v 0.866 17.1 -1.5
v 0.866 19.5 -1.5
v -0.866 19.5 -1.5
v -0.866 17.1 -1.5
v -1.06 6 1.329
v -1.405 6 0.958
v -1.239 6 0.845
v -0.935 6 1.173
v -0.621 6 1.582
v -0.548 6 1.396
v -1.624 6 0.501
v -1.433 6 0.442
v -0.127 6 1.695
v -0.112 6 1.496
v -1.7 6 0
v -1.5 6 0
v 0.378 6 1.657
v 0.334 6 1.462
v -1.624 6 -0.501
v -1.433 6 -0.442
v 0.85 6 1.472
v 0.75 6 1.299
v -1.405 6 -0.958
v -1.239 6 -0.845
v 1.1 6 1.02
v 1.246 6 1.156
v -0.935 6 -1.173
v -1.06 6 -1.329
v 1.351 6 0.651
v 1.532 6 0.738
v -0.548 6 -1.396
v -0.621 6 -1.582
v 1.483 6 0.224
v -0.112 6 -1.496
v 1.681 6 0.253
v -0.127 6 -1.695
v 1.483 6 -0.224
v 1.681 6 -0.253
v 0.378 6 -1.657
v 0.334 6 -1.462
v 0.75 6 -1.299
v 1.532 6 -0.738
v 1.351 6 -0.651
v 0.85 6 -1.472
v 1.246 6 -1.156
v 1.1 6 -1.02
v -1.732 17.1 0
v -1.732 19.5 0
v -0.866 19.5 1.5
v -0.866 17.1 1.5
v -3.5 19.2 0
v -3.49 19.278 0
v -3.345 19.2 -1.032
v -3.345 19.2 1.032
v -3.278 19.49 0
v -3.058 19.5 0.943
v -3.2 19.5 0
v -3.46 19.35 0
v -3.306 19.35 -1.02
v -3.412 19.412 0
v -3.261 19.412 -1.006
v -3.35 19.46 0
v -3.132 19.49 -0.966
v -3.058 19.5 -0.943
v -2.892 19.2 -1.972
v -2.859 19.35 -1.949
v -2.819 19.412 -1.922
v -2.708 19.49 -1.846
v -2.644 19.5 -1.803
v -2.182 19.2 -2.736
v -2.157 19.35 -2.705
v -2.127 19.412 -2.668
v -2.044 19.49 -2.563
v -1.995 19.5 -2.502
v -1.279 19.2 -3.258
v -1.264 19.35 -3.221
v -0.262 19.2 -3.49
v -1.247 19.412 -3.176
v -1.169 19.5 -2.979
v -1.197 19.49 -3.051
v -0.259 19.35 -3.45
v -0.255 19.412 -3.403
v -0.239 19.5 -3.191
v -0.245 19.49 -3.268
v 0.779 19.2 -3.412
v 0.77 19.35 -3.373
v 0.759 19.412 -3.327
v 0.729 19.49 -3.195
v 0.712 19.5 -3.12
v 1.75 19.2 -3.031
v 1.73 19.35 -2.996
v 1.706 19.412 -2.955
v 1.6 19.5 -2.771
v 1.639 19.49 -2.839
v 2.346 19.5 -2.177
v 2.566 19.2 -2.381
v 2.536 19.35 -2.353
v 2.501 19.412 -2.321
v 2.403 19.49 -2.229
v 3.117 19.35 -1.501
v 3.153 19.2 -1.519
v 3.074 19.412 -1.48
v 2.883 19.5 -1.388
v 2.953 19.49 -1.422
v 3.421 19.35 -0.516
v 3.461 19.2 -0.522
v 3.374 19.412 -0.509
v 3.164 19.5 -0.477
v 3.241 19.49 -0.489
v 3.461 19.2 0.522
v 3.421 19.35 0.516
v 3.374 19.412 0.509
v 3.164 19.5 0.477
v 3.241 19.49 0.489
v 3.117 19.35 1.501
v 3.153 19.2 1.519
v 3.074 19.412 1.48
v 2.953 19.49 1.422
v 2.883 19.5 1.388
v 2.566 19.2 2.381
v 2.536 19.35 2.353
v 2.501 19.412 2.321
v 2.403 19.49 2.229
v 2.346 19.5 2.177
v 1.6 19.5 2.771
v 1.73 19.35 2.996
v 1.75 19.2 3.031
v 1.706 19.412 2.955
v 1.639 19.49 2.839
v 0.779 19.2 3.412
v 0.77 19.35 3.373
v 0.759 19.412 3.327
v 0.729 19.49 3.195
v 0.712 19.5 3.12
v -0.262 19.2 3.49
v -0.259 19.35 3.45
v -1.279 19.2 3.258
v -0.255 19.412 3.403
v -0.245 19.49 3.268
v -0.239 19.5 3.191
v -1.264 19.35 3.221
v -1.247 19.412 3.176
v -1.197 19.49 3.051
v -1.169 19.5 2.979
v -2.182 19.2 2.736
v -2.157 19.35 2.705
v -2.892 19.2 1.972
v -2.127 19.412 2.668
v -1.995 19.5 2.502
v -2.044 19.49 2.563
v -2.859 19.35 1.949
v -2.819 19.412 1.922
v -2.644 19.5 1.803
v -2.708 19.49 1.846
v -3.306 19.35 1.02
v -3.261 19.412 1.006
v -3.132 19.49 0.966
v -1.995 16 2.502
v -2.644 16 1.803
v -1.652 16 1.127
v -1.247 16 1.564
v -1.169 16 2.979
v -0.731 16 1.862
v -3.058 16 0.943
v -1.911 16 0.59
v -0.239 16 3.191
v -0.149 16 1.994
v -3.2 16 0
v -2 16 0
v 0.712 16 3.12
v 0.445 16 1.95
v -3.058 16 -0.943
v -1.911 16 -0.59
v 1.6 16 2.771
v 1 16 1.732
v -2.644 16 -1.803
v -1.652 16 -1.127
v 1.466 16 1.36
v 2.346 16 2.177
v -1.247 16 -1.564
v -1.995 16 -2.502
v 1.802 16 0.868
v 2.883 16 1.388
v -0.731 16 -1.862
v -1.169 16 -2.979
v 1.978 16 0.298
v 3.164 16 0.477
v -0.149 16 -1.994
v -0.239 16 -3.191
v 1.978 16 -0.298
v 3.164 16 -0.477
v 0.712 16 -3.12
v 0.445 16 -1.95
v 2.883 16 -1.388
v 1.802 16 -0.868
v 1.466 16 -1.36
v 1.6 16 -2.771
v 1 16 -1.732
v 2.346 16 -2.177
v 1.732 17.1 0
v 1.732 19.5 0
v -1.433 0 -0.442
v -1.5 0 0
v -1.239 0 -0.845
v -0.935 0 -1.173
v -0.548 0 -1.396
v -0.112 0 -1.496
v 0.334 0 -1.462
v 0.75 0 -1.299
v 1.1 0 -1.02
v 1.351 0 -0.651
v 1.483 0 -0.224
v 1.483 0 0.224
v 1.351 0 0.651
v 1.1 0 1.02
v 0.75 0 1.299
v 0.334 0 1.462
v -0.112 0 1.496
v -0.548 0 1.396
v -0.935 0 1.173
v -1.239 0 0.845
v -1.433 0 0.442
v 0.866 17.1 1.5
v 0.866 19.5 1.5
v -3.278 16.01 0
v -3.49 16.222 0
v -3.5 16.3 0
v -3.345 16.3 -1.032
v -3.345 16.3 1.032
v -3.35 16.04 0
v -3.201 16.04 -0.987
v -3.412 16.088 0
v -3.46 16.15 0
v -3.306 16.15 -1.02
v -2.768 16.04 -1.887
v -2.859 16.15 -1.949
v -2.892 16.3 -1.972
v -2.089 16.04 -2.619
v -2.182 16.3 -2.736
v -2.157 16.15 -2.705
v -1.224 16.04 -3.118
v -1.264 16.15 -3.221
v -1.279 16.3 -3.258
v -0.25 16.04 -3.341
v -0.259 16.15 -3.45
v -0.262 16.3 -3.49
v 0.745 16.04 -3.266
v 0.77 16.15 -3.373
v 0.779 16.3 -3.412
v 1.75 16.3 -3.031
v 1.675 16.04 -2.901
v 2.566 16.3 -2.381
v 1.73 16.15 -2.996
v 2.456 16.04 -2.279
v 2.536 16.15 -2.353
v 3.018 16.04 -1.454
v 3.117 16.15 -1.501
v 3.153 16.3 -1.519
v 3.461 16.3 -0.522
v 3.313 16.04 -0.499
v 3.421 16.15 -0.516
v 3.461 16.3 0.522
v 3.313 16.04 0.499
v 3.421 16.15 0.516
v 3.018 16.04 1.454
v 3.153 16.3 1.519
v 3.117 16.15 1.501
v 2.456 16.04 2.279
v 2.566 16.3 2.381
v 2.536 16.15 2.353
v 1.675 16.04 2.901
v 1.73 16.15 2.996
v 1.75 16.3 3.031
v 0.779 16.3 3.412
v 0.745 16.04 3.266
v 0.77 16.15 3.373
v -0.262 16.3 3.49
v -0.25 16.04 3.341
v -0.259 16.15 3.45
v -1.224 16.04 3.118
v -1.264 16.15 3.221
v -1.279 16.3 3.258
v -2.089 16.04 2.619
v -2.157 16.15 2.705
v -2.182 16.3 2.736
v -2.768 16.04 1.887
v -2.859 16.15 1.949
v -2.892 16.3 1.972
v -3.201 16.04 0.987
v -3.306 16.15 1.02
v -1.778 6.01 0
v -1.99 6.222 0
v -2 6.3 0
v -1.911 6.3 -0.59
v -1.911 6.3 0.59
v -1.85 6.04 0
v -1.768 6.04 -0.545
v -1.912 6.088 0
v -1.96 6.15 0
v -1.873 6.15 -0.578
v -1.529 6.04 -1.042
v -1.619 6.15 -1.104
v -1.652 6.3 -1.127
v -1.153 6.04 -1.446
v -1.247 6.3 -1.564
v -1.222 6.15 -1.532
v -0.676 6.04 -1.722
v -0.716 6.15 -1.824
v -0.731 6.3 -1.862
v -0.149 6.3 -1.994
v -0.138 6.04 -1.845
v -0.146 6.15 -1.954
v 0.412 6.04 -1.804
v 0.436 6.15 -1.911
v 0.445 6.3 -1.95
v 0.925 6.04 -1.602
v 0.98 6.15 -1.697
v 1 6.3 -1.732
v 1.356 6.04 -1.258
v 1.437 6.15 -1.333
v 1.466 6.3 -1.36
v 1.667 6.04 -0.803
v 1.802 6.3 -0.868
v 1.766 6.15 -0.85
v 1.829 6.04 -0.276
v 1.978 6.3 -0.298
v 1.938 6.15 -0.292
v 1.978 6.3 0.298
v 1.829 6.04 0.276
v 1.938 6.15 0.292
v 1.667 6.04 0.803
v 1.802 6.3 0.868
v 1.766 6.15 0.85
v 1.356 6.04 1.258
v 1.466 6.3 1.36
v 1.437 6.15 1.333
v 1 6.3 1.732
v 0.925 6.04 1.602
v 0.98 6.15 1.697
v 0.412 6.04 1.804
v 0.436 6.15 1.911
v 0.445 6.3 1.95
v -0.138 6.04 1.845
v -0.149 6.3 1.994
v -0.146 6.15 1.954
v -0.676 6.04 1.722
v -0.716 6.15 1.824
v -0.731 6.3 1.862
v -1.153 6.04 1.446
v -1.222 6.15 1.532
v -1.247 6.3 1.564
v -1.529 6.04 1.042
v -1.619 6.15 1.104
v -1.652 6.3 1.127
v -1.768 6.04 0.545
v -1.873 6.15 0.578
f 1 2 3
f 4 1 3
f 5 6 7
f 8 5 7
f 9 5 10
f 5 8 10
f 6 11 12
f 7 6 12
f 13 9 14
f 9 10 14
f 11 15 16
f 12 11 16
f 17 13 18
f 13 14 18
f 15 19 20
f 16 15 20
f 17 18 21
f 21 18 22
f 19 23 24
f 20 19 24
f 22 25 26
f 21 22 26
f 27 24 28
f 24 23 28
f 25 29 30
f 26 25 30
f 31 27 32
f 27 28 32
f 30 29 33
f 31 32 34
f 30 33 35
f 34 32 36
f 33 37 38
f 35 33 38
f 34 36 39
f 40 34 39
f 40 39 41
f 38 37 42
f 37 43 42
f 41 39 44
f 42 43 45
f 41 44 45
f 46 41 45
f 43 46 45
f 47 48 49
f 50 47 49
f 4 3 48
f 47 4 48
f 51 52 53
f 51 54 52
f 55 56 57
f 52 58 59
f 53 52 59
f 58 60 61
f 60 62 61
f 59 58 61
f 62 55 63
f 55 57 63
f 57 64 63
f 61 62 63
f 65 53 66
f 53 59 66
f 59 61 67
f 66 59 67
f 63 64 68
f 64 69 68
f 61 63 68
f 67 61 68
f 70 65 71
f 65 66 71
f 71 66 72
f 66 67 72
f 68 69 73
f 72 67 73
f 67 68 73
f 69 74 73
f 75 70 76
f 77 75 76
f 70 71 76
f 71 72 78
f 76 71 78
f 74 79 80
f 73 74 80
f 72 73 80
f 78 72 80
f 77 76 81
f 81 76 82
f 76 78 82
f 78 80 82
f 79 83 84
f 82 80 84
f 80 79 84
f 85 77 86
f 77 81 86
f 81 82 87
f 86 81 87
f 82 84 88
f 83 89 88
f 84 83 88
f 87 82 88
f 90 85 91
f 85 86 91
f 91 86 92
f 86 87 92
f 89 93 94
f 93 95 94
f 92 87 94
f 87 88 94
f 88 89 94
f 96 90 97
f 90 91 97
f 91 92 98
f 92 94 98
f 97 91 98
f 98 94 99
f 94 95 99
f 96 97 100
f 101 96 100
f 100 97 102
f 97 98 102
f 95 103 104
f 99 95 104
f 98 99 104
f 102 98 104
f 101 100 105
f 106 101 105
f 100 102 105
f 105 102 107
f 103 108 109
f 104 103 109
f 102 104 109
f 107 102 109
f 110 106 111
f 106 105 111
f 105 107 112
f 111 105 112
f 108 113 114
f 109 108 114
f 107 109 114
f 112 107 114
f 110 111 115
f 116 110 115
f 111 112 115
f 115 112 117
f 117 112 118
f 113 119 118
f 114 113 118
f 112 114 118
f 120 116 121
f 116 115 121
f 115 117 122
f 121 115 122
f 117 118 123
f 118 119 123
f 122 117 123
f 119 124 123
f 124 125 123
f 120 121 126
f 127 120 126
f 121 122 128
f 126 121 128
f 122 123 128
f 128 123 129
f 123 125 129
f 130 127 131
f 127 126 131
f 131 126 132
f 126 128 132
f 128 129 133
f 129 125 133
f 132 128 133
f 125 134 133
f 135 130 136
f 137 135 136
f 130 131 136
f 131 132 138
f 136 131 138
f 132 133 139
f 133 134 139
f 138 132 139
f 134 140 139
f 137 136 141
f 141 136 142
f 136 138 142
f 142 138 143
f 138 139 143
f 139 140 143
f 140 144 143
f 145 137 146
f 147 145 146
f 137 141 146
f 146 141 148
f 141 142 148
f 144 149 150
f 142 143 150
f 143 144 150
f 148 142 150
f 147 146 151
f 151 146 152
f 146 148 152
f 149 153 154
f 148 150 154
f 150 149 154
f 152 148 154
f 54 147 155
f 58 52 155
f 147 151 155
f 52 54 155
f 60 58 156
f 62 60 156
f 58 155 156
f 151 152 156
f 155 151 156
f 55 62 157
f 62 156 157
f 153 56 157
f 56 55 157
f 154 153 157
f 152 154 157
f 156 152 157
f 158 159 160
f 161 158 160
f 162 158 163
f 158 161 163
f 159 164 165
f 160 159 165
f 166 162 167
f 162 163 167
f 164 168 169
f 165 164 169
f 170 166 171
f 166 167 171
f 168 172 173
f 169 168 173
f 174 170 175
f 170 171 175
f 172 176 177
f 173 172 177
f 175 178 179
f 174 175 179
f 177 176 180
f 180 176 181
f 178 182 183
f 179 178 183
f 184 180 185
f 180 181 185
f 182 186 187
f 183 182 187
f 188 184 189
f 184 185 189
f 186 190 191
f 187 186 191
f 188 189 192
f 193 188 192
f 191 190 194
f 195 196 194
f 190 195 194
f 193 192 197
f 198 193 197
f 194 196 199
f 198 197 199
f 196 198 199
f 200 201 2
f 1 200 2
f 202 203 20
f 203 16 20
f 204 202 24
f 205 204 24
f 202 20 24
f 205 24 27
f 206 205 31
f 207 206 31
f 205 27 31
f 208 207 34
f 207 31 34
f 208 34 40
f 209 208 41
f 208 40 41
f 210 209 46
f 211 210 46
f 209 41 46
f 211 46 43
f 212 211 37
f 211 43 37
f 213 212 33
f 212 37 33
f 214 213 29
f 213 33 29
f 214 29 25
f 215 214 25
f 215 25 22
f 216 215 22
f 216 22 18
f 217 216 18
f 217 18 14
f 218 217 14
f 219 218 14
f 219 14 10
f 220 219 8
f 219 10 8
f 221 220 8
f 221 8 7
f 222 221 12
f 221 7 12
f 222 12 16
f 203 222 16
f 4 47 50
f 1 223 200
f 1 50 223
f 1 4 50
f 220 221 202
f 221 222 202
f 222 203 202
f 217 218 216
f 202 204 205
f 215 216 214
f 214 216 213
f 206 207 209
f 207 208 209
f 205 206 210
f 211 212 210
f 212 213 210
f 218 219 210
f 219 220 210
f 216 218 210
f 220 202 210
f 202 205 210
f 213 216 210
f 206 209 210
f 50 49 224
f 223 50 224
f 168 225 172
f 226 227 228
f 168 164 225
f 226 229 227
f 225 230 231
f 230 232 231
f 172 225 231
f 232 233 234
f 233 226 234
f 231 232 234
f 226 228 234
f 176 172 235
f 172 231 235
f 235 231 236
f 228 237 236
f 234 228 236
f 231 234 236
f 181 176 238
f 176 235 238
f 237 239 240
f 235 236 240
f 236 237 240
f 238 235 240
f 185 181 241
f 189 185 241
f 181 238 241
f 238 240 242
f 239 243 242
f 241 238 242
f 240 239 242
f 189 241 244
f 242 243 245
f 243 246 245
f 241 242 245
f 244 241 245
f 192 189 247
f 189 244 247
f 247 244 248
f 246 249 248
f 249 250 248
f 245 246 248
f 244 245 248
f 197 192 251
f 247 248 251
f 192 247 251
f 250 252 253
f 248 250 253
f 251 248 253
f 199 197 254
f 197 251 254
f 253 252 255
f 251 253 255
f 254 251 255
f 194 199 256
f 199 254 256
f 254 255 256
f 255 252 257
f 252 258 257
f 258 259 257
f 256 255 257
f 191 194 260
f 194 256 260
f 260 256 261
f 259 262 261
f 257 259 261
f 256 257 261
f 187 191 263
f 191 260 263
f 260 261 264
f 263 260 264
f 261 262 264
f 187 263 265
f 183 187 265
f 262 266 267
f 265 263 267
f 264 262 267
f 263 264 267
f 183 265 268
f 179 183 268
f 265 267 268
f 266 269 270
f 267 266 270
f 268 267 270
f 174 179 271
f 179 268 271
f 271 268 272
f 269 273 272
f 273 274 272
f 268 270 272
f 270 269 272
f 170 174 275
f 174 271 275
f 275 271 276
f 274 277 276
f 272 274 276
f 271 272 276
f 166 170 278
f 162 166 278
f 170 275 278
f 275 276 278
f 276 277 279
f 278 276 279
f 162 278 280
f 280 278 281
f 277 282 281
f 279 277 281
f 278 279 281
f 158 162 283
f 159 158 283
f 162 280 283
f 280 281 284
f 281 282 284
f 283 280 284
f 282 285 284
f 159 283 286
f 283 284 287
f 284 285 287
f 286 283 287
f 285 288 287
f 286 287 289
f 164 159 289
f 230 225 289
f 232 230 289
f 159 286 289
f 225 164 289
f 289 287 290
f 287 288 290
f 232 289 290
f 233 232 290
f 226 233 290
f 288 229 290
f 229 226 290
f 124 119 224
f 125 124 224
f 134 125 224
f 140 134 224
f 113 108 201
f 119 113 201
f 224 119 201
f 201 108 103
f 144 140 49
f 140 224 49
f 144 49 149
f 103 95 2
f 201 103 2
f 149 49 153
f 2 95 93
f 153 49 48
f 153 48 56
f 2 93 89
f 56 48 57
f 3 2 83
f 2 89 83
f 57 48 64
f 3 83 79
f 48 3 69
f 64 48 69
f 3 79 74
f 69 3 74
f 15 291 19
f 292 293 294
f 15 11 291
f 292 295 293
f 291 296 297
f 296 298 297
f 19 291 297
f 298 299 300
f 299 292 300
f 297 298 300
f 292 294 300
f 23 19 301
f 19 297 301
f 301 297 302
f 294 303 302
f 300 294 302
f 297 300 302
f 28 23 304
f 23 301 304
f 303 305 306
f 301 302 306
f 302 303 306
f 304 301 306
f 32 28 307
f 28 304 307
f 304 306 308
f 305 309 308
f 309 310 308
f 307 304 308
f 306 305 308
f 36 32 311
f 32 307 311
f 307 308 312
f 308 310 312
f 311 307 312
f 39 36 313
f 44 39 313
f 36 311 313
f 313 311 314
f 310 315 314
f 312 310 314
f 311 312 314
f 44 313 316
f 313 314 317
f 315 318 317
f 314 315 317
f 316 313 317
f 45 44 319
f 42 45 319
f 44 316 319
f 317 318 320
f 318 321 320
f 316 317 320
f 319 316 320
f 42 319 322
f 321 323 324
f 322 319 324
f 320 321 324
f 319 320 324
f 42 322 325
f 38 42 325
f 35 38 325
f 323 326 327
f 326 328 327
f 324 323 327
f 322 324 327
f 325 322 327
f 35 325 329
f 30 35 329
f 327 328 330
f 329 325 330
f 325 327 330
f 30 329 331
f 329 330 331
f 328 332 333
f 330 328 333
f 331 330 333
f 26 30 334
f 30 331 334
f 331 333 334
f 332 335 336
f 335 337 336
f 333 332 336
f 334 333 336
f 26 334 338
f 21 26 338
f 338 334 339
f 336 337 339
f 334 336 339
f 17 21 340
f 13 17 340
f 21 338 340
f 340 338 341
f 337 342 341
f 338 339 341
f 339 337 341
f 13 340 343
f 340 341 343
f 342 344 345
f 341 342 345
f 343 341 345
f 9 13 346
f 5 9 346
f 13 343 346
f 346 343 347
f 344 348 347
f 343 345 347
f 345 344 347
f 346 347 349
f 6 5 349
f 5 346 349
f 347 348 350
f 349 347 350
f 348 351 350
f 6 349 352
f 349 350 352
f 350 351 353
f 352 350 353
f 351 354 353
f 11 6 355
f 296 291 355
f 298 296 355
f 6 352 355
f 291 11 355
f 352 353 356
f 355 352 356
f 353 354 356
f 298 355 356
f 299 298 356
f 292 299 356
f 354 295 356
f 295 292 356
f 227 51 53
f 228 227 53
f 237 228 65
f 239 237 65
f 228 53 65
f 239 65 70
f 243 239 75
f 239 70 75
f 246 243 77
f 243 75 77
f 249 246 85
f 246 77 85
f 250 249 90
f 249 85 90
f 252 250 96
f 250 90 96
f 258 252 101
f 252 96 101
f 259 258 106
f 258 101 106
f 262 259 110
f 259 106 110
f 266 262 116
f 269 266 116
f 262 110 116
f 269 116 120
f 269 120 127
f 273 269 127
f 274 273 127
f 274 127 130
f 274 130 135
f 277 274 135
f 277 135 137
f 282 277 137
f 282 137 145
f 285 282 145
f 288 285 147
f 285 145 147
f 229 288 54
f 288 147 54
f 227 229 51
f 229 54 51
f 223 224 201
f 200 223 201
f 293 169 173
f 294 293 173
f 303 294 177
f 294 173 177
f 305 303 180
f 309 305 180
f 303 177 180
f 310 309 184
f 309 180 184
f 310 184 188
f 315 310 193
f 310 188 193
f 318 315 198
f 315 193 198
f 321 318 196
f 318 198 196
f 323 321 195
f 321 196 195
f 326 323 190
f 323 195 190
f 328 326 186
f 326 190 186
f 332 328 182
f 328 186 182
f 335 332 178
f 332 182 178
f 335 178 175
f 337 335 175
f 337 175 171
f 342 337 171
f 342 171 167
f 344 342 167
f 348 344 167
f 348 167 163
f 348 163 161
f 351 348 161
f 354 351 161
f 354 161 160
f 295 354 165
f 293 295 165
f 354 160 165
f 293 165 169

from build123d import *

# Parameters (mm, degrees)
FILLET_1_R          = 0.3
CUT_EXTRUDE_1_DEPTH = 2.4


with BuildPart() as part:
    # 草图1 → 旋转1 (revolve)
    with BuildSketch(Plane.XY):
        Polygon((0, 0), (-1.5, 0), (-1.5, 6), (-2, 6), (-2, 16), (-3.5, 16), (-3.5, 19.5), (0, 19.5), align=None)
    revolve(axis=Axis((0, 19.5, 0), (0, -1, 0)))

    # 圆角1
    fillet_1_edges = [part.edges().sort_by_distance(p)[0] for p in [
        (3.5, 19.5, 0),
        (3.5, 16, 0),
        (2, 6, 0),
    ]]
    fillet(fillet_1_edges, radius=FILLET_1_R)

    # 草图2 → 切除-拉伸1 (cut)
    with BuildSketch(Plane(origin=(0, 19.5, 0), x_dir=(1, 0, 0), z_dir=(0, 1, 0))):
        Polygon((0.866025404, -1.5), (1.732050808, 0), (0.866025404, 1.5), (-0.866025404, 1.5), (-1.732050808, 0), (-0.866025404, -1.5), align=None)
    extrude(amount=-CUT_EXTRUDE_1_DEPTH, mode=Mode.SUBTRACT)


solid = part.part
